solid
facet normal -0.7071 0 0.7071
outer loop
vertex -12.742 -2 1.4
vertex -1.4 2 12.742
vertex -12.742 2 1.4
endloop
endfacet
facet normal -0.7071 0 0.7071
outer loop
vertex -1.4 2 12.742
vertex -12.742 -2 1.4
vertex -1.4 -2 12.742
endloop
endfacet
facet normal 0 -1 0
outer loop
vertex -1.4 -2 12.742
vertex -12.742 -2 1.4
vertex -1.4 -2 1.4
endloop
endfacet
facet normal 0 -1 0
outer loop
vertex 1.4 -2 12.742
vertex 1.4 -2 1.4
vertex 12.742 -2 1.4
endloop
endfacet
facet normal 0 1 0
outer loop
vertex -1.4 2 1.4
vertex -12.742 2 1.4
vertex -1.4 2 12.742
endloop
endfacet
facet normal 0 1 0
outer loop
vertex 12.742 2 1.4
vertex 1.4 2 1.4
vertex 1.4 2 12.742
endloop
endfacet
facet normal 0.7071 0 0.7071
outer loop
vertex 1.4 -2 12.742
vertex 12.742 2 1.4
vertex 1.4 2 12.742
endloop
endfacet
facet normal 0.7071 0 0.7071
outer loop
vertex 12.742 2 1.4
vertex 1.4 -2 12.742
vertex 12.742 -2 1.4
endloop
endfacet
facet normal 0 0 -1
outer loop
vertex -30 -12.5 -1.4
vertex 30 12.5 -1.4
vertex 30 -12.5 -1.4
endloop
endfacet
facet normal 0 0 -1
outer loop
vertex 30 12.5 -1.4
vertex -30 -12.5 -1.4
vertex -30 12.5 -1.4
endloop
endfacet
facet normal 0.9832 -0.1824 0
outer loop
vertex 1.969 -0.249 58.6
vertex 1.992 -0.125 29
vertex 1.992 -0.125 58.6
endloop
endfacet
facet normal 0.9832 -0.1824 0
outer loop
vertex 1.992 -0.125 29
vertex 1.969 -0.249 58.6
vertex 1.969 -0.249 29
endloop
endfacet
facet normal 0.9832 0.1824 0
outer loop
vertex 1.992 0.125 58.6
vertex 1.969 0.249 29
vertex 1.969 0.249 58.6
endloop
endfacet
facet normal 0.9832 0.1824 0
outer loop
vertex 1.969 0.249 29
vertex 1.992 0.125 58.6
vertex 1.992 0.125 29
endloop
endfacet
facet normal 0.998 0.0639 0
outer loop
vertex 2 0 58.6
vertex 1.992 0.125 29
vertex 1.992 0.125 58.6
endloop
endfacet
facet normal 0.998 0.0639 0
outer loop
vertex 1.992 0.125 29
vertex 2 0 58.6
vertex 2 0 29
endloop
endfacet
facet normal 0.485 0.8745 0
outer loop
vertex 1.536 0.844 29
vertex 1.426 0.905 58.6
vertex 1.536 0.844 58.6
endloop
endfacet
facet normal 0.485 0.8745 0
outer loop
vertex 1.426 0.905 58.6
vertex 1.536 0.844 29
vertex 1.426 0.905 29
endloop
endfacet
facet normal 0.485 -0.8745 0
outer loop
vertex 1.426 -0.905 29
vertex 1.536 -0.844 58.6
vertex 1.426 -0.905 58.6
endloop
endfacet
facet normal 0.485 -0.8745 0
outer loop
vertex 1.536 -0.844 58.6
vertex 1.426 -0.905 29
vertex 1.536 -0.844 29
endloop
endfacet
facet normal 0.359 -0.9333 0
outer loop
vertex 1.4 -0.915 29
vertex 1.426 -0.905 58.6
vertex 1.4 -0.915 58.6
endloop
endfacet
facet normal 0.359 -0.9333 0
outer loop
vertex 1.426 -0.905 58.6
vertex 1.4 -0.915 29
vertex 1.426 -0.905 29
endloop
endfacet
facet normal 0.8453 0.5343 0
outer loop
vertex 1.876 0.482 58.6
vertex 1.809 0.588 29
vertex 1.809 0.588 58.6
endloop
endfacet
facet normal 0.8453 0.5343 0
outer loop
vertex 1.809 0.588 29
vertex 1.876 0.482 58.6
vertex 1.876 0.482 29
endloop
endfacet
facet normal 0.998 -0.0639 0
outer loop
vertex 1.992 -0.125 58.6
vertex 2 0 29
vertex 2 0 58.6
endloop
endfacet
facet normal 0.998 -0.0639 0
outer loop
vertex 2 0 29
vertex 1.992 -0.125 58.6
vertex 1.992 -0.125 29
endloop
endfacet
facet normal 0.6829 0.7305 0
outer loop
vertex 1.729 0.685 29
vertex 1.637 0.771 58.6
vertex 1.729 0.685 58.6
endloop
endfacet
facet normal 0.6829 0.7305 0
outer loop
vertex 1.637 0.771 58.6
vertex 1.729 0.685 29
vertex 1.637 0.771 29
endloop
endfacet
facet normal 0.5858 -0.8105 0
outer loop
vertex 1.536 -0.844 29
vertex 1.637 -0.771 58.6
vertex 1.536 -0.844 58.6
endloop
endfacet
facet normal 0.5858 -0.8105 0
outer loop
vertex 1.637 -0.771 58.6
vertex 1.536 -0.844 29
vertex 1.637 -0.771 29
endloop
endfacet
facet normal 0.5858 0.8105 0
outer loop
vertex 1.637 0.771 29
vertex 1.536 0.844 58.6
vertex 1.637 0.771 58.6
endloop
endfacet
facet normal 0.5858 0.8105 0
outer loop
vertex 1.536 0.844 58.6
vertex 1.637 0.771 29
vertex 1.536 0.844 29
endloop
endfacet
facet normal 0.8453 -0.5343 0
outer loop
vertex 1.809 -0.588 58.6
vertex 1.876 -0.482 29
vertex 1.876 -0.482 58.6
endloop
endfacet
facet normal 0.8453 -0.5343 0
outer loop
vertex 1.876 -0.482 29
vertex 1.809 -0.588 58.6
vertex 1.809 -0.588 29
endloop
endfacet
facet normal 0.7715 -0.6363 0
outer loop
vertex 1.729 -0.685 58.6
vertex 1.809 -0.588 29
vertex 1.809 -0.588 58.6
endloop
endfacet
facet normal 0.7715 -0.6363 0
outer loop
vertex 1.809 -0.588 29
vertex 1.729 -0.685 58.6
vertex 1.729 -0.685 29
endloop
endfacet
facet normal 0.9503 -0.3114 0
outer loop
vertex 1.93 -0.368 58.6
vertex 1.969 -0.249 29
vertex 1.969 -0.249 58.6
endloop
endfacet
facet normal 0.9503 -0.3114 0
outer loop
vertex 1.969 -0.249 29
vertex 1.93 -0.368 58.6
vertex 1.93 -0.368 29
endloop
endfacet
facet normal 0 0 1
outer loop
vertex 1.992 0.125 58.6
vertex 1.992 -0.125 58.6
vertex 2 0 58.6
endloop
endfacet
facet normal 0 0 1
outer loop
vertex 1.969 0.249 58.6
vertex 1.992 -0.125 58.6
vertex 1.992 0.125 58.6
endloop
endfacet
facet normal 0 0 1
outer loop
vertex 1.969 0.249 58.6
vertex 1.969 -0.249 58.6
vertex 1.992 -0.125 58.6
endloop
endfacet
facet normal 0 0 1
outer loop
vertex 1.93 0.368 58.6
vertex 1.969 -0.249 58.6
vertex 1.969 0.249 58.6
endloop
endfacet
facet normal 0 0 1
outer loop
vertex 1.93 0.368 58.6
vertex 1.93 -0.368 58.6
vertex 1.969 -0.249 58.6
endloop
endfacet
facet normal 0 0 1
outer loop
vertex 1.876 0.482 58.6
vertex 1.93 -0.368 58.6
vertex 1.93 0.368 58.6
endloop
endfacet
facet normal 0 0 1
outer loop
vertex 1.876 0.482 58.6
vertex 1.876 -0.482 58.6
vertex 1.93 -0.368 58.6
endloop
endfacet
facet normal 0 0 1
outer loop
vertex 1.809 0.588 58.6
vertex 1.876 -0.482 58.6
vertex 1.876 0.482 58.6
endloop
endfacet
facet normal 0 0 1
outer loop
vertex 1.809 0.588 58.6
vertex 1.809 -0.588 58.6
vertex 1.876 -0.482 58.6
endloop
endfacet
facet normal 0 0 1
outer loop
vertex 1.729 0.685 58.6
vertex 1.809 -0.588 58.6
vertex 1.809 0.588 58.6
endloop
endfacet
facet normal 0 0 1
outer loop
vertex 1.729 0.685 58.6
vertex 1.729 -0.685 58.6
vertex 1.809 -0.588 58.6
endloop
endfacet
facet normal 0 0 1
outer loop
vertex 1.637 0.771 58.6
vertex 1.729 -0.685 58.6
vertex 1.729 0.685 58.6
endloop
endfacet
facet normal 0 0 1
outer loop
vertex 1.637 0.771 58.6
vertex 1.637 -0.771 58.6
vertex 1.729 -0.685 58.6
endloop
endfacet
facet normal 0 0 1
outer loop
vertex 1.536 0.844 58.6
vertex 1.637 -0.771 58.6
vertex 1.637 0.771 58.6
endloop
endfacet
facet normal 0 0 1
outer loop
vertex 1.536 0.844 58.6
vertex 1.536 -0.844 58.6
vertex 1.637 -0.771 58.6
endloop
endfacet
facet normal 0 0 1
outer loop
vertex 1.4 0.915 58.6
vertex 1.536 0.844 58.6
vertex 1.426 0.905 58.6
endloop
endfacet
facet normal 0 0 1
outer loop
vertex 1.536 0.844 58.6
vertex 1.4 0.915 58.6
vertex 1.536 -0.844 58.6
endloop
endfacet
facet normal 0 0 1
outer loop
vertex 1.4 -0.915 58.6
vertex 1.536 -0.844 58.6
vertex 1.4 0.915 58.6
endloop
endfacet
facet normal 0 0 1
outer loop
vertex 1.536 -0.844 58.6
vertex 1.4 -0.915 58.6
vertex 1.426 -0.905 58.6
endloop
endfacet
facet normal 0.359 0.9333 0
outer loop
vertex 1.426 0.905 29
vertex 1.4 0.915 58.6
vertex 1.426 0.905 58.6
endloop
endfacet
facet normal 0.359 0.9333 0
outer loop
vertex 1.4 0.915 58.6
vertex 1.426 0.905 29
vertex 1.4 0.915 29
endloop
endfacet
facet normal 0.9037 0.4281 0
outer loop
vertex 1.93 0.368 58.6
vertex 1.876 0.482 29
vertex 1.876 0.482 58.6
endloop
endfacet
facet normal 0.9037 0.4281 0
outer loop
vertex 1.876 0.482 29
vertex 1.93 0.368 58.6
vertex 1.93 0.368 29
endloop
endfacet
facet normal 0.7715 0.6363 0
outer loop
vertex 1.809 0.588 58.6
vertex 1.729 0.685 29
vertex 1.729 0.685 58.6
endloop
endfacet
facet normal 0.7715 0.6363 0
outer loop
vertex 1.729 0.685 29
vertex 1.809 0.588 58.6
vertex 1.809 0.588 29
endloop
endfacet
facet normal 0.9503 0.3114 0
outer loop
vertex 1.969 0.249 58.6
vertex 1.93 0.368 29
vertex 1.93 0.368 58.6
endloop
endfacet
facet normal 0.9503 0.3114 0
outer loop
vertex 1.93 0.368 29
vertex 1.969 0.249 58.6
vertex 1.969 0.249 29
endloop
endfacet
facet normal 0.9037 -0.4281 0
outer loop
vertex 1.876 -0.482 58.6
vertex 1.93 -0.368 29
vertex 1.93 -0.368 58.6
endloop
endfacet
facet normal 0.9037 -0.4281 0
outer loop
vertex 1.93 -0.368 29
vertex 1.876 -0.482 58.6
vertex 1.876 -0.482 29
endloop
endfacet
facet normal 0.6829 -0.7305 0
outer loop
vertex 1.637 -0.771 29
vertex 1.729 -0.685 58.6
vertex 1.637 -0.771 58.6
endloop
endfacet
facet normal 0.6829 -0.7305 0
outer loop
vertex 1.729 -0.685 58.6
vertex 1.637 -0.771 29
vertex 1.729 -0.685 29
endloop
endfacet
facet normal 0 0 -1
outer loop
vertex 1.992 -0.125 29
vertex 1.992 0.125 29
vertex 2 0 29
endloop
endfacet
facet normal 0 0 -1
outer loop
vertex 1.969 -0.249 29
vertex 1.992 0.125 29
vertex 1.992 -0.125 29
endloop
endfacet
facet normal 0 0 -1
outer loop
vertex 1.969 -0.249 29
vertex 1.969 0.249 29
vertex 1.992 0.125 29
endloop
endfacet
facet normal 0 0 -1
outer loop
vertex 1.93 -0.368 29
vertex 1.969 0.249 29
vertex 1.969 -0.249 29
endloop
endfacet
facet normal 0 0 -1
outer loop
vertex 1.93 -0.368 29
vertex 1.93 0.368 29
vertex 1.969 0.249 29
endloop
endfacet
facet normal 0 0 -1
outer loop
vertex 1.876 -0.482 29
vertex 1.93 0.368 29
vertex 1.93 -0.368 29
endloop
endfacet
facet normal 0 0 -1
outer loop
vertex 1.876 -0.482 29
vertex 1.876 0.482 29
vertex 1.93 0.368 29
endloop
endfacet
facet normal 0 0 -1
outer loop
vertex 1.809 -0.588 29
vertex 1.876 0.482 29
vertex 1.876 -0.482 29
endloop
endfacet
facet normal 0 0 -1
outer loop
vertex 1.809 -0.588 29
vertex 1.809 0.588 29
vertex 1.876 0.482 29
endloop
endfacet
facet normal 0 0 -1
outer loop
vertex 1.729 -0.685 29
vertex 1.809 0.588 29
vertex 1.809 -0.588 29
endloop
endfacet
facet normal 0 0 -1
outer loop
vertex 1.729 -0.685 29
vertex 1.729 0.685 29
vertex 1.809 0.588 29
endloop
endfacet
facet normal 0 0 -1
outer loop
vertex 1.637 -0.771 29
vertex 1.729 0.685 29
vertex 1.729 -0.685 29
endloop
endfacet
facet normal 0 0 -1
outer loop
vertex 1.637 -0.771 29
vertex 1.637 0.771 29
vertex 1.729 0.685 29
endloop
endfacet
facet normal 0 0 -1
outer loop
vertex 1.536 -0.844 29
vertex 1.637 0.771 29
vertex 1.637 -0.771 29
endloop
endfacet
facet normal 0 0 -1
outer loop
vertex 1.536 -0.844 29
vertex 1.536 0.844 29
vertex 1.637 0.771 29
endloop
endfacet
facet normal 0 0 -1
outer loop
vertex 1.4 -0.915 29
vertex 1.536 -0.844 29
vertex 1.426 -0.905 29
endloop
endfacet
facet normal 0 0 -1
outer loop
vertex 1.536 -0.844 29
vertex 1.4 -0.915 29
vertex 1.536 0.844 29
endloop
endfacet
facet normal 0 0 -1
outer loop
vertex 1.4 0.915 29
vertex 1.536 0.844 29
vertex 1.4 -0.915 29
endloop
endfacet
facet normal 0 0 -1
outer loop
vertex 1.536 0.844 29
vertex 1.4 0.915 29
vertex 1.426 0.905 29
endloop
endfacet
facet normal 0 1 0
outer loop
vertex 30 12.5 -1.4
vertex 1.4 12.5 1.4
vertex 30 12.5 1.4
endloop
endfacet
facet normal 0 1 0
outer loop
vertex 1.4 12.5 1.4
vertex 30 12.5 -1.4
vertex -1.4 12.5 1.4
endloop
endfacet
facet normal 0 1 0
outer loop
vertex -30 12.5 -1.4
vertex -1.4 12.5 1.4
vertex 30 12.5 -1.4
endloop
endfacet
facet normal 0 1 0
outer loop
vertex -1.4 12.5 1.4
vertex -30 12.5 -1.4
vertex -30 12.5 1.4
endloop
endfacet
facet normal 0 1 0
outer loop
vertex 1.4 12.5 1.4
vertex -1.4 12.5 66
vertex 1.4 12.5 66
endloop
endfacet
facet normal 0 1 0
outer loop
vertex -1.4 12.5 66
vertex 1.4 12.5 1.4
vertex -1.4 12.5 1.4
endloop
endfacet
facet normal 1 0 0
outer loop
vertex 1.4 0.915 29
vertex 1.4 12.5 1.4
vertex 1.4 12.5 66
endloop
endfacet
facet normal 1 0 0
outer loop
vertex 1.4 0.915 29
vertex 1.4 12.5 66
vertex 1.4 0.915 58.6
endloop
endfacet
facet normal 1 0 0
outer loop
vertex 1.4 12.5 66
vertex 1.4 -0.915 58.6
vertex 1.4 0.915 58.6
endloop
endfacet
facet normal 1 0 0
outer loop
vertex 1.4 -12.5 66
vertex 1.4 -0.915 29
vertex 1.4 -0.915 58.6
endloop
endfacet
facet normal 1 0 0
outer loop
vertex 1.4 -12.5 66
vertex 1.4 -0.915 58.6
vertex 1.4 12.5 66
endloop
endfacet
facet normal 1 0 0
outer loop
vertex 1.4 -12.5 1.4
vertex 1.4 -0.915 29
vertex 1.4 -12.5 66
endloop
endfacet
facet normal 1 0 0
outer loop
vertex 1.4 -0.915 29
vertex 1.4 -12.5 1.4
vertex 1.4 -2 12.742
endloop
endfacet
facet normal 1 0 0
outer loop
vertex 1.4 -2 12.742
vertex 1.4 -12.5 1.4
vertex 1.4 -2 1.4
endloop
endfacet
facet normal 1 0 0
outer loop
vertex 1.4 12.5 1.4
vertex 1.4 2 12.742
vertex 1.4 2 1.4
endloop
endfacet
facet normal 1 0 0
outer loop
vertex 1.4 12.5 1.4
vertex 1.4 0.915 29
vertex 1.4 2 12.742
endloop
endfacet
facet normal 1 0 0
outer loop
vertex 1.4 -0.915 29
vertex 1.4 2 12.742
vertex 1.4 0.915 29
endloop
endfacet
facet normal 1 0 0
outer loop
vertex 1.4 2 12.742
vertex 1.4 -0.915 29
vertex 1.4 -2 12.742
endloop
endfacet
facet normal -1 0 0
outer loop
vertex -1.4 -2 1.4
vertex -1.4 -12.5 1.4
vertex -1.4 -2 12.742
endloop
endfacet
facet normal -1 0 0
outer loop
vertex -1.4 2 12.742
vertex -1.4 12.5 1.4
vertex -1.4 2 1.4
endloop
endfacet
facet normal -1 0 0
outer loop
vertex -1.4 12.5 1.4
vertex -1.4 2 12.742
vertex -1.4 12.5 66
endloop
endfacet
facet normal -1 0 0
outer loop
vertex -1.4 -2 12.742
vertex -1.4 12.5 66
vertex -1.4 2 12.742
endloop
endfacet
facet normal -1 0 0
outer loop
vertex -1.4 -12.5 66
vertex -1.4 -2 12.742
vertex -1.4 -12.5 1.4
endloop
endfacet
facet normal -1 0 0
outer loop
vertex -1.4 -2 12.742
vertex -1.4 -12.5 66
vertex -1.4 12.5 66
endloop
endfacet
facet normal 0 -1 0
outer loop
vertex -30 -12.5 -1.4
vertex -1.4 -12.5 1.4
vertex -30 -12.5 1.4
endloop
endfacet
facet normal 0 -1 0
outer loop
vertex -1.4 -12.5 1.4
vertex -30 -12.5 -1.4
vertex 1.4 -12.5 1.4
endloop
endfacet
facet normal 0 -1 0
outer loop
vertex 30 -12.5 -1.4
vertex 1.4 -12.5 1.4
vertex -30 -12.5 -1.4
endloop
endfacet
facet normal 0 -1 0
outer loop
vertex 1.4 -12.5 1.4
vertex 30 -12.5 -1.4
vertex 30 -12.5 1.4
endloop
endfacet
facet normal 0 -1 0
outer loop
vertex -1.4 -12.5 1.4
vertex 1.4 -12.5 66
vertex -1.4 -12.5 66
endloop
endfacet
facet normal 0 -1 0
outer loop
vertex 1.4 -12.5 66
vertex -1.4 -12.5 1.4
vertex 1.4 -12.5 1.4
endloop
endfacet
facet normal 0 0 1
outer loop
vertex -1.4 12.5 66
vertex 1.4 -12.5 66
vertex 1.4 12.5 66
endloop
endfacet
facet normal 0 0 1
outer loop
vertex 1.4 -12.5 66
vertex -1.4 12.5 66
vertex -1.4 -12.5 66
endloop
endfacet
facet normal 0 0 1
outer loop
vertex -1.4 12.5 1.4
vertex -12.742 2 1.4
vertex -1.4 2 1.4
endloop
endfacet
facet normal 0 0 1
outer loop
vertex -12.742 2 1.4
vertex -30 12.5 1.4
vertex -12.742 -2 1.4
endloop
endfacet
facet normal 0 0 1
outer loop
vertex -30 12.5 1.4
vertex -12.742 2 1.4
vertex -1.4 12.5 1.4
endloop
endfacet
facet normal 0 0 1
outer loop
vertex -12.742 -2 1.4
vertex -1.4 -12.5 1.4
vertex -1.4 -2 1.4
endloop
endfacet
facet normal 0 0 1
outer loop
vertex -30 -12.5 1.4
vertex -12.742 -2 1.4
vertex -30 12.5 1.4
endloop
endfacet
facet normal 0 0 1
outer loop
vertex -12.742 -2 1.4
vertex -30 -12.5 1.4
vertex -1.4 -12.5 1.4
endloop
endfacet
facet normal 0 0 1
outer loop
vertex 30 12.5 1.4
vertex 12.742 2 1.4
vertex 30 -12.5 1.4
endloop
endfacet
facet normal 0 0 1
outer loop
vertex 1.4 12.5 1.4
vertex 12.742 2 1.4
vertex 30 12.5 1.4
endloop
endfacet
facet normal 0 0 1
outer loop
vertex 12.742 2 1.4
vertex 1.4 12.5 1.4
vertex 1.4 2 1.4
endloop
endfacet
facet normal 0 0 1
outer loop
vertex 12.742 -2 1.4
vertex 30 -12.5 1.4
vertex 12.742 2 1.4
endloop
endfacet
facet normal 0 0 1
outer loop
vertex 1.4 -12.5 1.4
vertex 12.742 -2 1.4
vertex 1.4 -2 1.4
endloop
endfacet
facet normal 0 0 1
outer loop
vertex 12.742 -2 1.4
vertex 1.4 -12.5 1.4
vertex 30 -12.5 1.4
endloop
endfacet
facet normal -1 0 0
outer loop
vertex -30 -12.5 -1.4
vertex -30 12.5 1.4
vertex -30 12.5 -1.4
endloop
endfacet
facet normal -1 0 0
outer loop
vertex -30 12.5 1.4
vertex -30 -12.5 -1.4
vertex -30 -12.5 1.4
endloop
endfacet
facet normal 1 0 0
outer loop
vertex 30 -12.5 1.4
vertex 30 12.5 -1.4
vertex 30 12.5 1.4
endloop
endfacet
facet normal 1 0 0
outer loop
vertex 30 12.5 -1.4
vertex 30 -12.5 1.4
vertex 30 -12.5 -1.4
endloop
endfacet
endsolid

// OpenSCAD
/*

*/
drzak_A();

module uchyt_repra(delka_rovneho_segmentu=20, delka_sikmeho_segmentu=37,sirka=25,tloustka=2.8){
    //delka_rovneho_segmentu=20;
    //delka_sikmeho_segmentu=37;
    //sirka=25;
    //tloustka=2.8;
    
    translate([0,0,-0.5*(-delka_rovneho_segmentu+delka_sikmeho_segmentu)]){
        color ("Khaki")translate ([1,0,0]) rotate ([0,0,0]) cylinder(h=0.8*delka_sikmeho_segmentu, r=1, $fn=50);
        color ("Yellow")translate ([0,0,delka_sikmeho_segmentu*0.5]) rotate ([90,0,90]) cube([sirka,delka_sikmeho_segmentu,tloustka], center=true);    
        color ("Gold")translate ([0,0,-0.5*delka_rovneho_segmentu]) rotate ([90,0,90]) cube([sirka,delka_rovneho_segmentu,tloustka], center=true);
    }//center translate
    
}//module

module drzak_A(){
    
    uchyt_delka_rovneho_segmentu=29;
    uchyt_delka_sikmeho_segmentu=37;
    uchyt_sirka=25;
    uchyt_tloustka=2.8;

    //podpera
    difference(){
    color ("green") translate([0,0,0]) rotate([90,45,0]) cube([20,20,4], center=true);
    color("grey")  translate([0,0,-10-0.5*uchyt_tloustka]) rotate([0,0,0]) cube([30,30,20], center=true);
    }
    
    //to co se bude lepit ke stolu
    translate([0,0,0]) rotate([0,0,90]) cube([uchyt_sirka,60,uchyt_tloustka], center=true);
    
    //samotna uchytka
    translate([0,0,0.5*uchyt_delka_rovneho_segmentu+0.5*uchyt_delka_sikmeho_segmentu])
        uchyt_repra(delka_rovneho_segmentu=uchyt_delka_rovneho_segmentu,
        delka_sikmeho_segmentu=uchyt_delka_sikmeho_segmentu,
        sirka=uchyt_sirka,
        tloustka=uchyt_tloustka);
    
    
    }




module drzak_B(){
    
    
    
    }
